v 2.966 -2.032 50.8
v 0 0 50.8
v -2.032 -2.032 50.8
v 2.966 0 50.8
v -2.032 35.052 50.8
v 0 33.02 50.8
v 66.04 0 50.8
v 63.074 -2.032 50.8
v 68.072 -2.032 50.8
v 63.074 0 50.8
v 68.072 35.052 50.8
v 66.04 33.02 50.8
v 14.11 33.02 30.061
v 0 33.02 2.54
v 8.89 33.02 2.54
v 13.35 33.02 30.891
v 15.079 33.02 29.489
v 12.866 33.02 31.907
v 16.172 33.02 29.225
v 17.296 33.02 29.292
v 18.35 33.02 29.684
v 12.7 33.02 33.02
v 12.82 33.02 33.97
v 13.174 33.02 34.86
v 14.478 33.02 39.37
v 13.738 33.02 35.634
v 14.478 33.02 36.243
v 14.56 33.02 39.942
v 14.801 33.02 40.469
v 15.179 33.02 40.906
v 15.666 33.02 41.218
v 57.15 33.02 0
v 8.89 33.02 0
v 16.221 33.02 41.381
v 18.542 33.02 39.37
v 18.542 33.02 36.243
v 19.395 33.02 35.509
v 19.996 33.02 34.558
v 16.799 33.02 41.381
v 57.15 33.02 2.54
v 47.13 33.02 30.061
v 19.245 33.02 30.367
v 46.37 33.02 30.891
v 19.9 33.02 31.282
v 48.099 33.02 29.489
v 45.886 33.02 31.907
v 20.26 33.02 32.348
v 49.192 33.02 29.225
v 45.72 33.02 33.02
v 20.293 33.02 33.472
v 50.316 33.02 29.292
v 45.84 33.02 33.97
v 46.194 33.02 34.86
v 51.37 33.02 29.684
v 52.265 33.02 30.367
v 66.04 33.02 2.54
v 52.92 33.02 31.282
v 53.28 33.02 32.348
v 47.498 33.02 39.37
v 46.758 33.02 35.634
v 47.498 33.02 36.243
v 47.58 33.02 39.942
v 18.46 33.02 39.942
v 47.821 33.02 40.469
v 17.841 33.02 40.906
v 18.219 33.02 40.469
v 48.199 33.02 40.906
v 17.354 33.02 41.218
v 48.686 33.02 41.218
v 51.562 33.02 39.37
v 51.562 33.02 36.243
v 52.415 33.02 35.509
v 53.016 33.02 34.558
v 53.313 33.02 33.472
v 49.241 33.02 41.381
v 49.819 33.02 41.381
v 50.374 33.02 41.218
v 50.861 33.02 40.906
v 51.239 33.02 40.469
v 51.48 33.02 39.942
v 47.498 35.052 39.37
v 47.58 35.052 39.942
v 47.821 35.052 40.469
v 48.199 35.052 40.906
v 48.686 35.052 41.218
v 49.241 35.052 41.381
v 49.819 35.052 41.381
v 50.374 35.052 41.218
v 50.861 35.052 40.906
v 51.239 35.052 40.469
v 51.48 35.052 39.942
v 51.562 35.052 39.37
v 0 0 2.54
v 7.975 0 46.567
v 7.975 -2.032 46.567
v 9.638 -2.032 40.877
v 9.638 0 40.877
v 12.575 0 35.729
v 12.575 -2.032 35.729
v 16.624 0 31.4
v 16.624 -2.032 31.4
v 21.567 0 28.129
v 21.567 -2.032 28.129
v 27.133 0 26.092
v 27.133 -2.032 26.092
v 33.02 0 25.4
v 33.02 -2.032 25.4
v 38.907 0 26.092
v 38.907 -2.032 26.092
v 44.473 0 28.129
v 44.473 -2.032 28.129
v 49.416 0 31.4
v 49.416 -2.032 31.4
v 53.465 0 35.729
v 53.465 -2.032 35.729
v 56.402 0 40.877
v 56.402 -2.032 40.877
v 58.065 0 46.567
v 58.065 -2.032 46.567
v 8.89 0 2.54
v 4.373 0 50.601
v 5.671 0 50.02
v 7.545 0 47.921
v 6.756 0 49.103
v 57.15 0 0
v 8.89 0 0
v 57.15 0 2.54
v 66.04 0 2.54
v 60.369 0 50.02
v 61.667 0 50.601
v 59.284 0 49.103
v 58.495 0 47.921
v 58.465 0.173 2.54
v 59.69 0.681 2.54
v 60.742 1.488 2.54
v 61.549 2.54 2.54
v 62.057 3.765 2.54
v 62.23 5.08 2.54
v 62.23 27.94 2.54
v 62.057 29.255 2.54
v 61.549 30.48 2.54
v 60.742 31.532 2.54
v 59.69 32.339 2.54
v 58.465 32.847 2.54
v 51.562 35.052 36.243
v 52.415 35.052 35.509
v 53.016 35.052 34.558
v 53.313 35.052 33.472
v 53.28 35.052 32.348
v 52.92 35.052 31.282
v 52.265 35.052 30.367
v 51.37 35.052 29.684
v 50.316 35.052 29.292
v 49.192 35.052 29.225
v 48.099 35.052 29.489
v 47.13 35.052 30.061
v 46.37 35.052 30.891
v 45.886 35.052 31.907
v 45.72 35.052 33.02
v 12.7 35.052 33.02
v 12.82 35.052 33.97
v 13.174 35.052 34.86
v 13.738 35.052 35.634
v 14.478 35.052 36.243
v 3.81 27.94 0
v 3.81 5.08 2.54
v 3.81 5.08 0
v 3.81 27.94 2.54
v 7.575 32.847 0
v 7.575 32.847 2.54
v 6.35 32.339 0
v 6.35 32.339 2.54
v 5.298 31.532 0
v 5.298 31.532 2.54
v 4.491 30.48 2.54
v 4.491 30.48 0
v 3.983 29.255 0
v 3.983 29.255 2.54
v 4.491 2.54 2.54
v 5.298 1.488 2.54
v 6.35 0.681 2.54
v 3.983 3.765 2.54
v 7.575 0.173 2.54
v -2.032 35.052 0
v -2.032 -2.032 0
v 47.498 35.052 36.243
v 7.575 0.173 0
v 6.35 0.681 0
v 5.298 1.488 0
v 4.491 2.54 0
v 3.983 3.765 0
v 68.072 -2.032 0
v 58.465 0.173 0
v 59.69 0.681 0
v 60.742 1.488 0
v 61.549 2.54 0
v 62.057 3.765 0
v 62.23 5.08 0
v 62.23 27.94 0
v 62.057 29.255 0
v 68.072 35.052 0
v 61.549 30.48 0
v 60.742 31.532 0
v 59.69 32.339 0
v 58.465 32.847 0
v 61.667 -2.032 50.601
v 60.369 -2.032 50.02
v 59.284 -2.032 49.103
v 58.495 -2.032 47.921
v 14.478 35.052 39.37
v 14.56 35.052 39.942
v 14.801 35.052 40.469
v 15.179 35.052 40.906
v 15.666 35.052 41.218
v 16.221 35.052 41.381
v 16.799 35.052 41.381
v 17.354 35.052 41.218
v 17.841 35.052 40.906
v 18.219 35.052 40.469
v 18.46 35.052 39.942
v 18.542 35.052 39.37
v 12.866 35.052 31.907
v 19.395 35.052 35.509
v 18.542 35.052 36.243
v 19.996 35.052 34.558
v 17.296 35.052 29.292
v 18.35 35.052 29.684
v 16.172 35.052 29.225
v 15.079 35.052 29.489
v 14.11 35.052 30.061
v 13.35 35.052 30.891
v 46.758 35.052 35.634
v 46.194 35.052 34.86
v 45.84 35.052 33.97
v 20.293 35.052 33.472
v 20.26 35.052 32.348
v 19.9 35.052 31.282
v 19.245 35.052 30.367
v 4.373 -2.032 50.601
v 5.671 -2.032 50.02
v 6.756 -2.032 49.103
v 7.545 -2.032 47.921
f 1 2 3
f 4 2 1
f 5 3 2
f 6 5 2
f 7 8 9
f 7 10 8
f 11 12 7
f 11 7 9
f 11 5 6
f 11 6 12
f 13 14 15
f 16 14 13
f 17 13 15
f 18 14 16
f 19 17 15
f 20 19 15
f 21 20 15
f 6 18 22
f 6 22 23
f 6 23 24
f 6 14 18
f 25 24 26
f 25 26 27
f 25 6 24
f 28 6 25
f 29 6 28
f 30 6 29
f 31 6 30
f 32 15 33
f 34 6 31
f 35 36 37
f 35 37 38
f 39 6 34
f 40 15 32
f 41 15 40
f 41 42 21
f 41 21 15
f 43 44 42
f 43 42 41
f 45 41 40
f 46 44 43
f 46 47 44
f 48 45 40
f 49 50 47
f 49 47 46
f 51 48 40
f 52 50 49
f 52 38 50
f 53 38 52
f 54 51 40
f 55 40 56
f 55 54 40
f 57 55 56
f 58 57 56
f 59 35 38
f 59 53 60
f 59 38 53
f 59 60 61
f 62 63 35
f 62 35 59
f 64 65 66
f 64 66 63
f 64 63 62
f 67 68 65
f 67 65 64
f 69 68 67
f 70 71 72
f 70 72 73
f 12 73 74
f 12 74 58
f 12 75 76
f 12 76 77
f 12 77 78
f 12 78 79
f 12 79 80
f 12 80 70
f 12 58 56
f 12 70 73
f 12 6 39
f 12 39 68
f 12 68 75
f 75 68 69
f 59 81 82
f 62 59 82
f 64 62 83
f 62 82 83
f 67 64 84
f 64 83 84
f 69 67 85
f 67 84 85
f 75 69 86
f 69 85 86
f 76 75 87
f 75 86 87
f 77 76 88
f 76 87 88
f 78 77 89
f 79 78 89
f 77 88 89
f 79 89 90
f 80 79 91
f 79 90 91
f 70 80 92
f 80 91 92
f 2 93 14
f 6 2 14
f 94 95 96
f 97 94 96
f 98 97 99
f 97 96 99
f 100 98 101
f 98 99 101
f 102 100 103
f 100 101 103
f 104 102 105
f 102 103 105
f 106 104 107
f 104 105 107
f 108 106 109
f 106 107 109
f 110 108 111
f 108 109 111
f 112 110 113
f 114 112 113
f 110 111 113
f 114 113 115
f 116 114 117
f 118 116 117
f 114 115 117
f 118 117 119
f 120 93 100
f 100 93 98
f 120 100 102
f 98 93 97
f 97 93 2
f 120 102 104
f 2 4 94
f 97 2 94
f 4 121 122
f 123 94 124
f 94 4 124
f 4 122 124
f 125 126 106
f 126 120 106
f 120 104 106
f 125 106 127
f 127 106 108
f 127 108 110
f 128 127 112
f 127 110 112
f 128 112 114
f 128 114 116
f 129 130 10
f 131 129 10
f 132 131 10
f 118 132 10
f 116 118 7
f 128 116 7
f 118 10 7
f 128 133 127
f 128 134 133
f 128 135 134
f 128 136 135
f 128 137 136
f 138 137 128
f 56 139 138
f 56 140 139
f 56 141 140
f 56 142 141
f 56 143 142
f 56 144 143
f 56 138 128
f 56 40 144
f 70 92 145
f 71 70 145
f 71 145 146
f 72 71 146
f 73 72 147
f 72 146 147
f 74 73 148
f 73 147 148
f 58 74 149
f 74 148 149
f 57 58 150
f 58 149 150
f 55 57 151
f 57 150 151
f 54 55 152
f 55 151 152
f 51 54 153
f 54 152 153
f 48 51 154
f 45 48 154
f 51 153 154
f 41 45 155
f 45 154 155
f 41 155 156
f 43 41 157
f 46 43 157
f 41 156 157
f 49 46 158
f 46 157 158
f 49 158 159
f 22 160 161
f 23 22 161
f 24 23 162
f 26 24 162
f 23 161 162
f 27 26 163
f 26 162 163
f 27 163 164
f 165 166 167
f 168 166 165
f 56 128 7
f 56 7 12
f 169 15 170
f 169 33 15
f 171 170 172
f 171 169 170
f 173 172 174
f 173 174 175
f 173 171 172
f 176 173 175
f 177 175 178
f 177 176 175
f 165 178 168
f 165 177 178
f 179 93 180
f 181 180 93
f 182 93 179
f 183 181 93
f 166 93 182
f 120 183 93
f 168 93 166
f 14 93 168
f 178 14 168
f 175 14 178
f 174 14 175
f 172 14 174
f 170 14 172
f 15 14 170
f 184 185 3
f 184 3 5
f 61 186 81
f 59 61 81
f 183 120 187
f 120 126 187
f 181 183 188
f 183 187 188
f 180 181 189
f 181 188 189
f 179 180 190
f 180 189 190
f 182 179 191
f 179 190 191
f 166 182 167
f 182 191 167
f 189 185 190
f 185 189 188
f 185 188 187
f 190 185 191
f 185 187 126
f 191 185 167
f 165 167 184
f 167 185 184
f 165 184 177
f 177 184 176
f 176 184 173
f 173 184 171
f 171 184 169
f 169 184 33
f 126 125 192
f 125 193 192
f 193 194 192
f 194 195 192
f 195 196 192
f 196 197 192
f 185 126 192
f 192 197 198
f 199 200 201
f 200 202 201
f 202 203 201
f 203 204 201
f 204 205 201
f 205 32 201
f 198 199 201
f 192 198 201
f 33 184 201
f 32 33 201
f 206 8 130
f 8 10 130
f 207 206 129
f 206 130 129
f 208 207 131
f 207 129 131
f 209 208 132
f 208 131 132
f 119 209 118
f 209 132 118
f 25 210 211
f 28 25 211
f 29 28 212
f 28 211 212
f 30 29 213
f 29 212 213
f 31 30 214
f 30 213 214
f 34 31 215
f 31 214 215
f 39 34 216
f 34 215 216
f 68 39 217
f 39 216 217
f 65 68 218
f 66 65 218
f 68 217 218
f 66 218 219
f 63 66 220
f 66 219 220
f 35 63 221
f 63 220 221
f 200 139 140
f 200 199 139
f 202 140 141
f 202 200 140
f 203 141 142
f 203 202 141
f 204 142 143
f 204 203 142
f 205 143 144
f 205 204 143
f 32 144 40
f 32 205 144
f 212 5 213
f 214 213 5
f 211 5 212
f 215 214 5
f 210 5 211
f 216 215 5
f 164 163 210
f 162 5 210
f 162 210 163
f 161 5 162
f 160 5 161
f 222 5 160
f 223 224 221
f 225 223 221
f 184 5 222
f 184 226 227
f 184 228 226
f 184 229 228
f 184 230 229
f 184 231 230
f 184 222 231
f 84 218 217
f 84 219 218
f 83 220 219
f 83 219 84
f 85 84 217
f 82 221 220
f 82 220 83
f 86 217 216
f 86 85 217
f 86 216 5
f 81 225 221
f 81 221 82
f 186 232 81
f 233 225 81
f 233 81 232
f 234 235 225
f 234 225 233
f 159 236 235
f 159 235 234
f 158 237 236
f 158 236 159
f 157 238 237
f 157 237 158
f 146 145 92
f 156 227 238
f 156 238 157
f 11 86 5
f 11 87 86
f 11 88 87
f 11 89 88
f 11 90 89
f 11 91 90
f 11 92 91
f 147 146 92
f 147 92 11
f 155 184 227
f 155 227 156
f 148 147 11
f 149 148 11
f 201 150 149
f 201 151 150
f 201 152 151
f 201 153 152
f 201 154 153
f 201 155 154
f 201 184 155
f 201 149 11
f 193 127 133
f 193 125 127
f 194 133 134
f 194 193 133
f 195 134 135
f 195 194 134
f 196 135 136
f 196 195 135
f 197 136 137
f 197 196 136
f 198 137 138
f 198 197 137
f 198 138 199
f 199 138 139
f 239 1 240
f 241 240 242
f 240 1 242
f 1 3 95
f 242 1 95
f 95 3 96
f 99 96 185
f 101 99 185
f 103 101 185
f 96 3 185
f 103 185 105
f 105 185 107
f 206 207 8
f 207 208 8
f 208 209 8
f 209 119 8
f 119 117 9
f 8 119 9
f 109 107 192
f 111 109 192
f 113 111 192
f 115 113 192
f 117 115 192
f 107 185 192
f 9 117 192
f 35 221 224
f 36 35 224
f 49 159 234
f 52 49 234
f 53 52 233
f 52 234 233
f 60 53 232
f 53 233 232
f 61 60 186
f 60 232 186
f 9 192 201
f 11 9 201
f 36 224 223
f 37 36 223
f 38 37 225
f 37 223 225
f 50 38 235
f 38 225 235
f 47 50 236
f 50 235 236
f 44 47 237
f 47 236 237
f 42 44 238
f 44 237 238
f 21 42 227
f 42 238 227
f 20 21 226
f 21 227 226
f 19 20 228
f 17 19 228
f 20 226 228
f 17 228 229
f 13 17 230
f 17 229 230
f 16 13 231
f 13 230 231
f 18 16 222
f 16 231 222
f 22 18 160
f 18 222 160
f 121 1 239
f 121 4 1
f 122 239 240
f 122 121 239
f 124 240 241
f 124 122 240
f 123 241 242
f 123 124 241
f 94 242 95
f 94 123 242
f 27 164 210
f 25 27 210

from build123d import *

# Parameters (mm, degrees)
F0_W     = 70.104
F0_H     = 37.084
F0_W_2   = 66.04
F0_H_2   = 33.02
F1_DEPTH = 50.8
F2_DEPTH = 2.54
F3_W     = 58.42
F3_H     = 33.02
F4_DEPTH = 25.4
F6_DEPTH = 25.4
F8_DEPTH = 25.4
F9_R     = 5.08


with BuildPart() as f1:
    # F0 (on Top) → F1 (new body)
    with BuildSketch(Plane.XY):
        with Locations((33.02, 16.51)):
            Rectangle(F0_W, F0_H)
        with Locations((33.02, 16.51)):
            Rectangle(F0_W_2, F0_H_2, mode=Mode.SUBTRACT)
    extrude(amount=F1_DEPTH)

    # F0 (on Top) → F2 (join)
    with BuildSketch(Plane.XY):
        with Locations((33.02, 16.51)):
            Rectangle(F0_W_2, F0_H_2)
    extrude(amount=F2_DEPTH)

    # F3 (on face) → F4 (cut)
    with BuildSketch(Plane.XY.offset(2.54)):
        with Locations((33.02, 16.51)):
            Rectangle(F3_W, F3_H)
    extrude(amount=-F4_DEPTH, mode=Mode.SUBTRACT)

    # F5 (on face) → F6 (cut)
    with BuildSketch(Plane.XZ.offset(2.032)):
        with BuildLine():
            Line((58.42, 50.8), (7.62, 50.8))
            ThreePointArc((7.62, 50.8), (33.02, 25.4), (58.42, 50.8))
        make_face()
    extrude(amount=-F6_DEPTH, mode=Mode.SUBTRACT)

    # F7 (on face) → F8 (cut)
    with BuildSketch(Plane(origin=(0, 35.052, 0), x_dir=(-1, 0, 0), z_dir=(0, 1, 0))):
        with BuildLine():
            ThreePointArc((-51.562, 36.2428986953), (-51.3704048468, 29.6839829137), (-45.72, 33.02))
            ThreePointArc((-45.72, 33.02), (-46.1939829137, 34.8604048468), (-47.498, 36.2428986953))
            ThreePointArc((-47.498, 36.2428986953), (-49.53, 36.83), (-51.562, 36.2428986953))
        make_face()
        with BuildLine():
            ThreePointArc((-51.562, 36.2428986953), (-49.53, 36.83), (-47.498, 36.2428986953))
            Line((-47.498, 36.2428986953), (-47.498, 39.37))
            ThreePointArc((-47.498, 39.37), (-49.53, 41.402), (-51.562, 39.37))
            Line((-51.562, 39.37), (-51.562, 36.2428986953))
        make_face()
        with BuildLine():
            ThreePointArc((-18.542, 36.2428986953), (-16.51, 36.83), (-14.478, 36.2428986953))
            Line((-14.478, 36.2428986953), (-14.478, 39.37))
            ThreePointArc((-14.478, 39.37), (-16.51, 41.402), (-18.542, 39.37))
            Line((-18.542, 39.37), (-18.542, 36.2428986953))
        make_face()
        with BuildLine():
            ThreePointArc((-18.542, 36.2428986953), (-18.3504048468, 29.6839829137), (-12.7, 33.02))
            ThreePointArc((-12.7, 33.02), (-13.1739829137, 34.8604048468), (-14.478, 36.2428986953))
            ThreePointArc((-14.478, 36.2428986953), (-16.51, 36.83), (-18.542, 36.2428986953))
        make_face()
    extrude(amount=-F8_DEPTH, mode=Mode.SUBTRACT)

    # F9
    f9_edges = [f1.edges().sort_by_distance(p)[0] for p in [
        (58.42, -1.016, 50.8),
        (7.62, -1.016, 50.8),
        (62.23, 0, 1.27),
        (62.23, 33.02, 1.27),
        (3.81, 33.02, 1.27),
        (3.81, 0, 1.27),
    ]]
    fillet(f9_edges, radius=F9_R)


solid = f1.part
